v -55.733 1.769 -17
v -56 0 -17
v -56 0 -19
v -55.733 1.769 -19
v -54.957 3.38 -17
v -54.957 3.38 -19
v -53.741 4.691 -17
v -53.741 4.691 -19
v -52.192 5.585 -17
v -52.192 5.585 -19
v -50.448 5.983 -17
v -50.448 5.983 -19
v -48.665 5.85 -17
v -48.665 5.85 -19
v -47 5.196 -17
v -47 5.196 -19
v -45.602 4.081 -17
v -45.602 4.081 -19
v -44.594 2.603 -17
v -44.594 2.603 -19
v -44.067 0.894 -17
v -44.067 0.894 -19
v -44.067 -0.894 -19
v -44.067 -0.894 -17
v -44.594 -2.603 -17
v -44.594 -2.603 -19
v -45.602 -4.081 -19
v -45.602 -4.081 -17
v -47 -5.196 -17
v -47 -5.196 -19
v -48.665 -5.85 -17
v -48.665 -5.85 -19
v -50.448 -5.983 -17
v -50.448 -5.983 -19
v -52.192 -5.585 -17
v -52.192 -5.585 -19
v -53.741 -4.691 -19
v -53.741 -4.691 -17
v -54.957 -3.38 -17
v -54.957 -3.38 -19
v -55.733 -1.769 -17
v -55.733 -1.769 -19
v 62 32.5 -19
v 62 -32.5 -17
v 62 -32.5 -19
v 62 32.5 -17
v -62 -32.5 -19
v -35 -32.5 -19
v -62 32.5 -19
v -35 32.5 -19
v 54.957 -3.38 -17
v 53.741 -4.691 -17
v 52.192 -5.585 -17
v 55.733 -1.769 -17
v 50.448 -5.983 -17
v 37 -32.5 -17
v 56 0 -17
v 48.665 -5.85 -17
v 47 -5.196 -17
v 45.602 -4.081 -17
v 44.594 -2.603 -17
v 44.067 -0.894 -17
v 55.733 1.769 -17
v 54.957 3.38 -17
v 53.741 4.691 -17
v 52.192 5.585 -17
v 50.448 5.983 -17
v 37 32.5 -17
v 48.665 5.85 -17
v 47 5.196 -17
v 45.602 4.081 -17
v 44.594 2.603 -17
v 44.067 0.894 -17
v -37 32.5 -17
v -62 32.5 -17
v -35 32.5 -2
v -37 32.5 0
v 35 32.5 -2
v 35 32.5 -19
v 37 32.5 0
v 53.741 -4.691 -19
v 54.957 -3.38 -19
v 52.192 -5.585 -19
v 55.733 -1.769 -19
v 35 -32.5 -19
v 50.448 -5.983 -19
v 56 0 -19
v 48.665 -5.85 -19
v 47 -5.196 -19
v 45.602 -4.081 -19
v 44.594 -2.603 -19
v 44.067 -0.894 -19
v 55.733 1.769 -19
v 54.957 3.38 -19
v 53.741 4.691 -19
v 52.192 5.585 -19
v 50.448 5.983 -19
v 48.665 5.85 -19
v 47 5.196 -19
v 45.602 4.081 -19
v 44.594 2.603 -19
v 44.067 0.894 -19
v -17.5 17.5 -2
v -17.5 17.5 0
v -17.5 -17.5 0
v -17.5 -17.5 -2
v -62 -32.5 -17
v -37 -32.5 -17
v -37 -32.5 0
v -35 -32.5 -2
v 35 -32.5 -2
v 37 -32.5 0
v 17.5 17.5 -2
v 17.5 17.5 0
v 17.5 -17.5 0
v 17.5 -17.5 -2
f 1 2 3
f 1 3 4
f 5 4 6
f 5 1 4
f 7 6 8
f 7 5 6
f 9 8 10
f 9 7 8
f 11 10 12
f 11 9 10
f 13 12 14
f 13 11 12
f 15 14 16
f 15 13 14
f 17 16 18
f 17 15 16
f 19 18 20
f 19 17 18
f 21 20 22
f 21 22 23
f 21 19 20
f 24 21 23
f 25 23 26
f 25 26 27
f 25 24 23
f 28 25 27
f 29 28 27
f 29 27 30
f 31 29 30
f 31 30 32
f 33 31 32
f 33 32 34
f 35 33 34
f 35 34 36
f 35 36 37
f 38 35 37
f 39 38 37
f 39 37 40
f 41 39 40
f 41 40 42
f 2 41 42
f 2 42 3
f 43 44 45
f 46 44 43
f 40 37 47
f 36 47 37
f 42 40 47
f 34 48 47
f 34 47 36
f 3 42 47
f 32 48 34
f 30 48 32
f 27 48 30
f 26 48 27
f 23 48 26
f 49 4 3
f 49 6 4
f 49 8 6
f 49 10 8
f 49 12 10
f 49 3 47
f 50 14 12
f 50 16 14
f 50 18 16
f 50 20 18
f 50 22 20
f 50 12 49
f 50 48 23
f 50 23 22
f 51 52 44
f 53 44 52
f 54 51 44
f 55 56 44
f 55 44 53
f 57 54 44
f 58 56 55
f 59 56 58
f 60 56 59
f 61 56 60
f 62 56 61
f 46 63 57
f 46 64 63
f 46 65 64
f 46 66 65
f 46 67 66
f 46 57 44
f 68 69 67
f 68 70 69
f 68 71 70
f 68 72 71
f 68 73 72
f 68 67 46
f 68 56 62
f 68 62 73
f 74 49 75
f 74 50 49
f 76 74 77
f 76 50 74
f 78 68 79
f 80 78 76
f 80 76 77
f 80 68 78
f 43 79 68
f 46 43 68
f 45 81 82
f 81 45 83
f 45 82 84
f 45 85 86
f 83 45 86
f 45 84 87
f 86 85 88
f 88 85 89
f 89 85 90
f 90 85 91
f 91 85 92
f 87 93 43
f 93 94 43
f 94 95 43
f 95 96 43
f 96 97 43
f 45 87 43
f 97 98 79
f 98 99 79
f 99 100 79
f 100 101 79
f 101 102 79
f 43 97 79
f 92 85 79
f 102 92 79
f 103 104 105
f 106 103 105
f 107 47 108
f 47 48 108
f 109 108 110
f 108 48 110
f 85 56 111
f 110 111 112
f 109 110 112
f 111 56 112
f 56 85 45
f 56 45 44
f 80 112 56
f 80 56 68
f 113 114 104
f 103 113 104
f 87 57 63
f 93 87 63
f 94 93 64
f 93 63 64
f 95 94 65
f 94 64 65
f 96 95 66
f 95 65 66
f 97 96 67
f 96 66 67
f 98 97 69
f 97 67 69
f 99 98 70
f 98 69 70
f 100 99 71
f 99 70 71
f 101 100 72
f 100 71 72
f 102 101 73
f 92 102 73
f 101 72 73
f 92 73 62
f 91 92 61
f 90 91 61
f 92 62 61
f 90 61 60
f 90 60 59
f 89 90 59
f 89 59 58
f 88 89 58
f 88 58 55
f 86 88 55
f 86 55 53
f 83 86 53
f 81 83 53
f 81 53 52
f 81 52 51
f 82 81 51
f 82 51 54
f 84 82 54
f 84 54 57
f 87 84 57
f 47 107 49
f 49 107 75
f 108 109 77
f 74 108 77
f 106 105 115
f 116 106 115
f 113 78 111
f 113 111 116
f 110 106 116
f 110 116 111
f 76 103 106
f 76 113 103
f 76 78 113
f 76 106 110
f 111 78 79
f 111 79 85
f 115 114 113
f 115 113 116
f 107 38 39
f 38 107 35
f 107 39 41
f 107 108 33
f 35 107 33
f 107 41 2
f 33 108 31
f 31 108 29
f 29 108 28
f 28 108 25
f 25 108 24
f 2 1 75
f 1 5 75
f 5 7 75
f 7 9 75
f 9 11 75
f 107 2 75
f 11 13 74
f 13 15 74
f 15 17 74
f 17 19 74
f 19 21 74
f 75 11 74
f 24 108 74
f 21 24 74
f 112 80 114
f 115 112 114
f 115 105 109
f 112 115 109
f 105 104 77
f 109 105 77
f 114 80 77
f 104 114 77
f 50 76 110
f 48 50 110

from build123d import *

# Parameters (mm, degrees)
F1_DEPTH = 2
F2_DEPTH = 19
F3_W     = 65
F3_H     = 2
F4_DEPTH = 25
F5_R     = 6
F6_DEPTH = 2.001


with BuildPart() as f1:
    # F0 (on Top) → F1 (new body)
    with BuildSketch(Plane.XY):
        Polygon((0, 32.5), (0, 17.5), (17.5, 17.5), (17.5, -17.5), (0, -17.5), (0, -32.5), (35, -32.5), (35, 0), (35, 32.5), align=None)
    extrude(amount=-F1_DEPTH)

    # F0 (on Top) → F2 (join)
    with BuildSketch(Plane.XY):
        Polygon((37, 32.5), (35, 32.5), (35, 0), (35, -32.5), (37, -32.5), align=None)
    extrude(amount=-F2_DEPTH)

    # F3 (on face) → F4 (join)
    with BuildSketch(Plane.YZ.offset(37)):
        with Locations((0, -18)):
            Rectangle(F3_W, F3_H)
    extrude(amount=F4_DEPTH)

    # F5 (on face) → F6 (cut, through all)
    with BuildSketch(Plane.XY.offset(-17)):
        with Locations((50, 0)):
            Circle(F5_R)
    extrude(amount=-F6_DEPTH, mode=Mode.SUBTRACT)

    # F7: F1 across face


with BuildPart() as f1_1:
    add(f1.part)
    add(f1.part.mirror(Plane(origin=(0, 25, -1), x_dir=(0, -1, 0), z_dir=(-1, 0, 0))))


solid = f1_1.part
